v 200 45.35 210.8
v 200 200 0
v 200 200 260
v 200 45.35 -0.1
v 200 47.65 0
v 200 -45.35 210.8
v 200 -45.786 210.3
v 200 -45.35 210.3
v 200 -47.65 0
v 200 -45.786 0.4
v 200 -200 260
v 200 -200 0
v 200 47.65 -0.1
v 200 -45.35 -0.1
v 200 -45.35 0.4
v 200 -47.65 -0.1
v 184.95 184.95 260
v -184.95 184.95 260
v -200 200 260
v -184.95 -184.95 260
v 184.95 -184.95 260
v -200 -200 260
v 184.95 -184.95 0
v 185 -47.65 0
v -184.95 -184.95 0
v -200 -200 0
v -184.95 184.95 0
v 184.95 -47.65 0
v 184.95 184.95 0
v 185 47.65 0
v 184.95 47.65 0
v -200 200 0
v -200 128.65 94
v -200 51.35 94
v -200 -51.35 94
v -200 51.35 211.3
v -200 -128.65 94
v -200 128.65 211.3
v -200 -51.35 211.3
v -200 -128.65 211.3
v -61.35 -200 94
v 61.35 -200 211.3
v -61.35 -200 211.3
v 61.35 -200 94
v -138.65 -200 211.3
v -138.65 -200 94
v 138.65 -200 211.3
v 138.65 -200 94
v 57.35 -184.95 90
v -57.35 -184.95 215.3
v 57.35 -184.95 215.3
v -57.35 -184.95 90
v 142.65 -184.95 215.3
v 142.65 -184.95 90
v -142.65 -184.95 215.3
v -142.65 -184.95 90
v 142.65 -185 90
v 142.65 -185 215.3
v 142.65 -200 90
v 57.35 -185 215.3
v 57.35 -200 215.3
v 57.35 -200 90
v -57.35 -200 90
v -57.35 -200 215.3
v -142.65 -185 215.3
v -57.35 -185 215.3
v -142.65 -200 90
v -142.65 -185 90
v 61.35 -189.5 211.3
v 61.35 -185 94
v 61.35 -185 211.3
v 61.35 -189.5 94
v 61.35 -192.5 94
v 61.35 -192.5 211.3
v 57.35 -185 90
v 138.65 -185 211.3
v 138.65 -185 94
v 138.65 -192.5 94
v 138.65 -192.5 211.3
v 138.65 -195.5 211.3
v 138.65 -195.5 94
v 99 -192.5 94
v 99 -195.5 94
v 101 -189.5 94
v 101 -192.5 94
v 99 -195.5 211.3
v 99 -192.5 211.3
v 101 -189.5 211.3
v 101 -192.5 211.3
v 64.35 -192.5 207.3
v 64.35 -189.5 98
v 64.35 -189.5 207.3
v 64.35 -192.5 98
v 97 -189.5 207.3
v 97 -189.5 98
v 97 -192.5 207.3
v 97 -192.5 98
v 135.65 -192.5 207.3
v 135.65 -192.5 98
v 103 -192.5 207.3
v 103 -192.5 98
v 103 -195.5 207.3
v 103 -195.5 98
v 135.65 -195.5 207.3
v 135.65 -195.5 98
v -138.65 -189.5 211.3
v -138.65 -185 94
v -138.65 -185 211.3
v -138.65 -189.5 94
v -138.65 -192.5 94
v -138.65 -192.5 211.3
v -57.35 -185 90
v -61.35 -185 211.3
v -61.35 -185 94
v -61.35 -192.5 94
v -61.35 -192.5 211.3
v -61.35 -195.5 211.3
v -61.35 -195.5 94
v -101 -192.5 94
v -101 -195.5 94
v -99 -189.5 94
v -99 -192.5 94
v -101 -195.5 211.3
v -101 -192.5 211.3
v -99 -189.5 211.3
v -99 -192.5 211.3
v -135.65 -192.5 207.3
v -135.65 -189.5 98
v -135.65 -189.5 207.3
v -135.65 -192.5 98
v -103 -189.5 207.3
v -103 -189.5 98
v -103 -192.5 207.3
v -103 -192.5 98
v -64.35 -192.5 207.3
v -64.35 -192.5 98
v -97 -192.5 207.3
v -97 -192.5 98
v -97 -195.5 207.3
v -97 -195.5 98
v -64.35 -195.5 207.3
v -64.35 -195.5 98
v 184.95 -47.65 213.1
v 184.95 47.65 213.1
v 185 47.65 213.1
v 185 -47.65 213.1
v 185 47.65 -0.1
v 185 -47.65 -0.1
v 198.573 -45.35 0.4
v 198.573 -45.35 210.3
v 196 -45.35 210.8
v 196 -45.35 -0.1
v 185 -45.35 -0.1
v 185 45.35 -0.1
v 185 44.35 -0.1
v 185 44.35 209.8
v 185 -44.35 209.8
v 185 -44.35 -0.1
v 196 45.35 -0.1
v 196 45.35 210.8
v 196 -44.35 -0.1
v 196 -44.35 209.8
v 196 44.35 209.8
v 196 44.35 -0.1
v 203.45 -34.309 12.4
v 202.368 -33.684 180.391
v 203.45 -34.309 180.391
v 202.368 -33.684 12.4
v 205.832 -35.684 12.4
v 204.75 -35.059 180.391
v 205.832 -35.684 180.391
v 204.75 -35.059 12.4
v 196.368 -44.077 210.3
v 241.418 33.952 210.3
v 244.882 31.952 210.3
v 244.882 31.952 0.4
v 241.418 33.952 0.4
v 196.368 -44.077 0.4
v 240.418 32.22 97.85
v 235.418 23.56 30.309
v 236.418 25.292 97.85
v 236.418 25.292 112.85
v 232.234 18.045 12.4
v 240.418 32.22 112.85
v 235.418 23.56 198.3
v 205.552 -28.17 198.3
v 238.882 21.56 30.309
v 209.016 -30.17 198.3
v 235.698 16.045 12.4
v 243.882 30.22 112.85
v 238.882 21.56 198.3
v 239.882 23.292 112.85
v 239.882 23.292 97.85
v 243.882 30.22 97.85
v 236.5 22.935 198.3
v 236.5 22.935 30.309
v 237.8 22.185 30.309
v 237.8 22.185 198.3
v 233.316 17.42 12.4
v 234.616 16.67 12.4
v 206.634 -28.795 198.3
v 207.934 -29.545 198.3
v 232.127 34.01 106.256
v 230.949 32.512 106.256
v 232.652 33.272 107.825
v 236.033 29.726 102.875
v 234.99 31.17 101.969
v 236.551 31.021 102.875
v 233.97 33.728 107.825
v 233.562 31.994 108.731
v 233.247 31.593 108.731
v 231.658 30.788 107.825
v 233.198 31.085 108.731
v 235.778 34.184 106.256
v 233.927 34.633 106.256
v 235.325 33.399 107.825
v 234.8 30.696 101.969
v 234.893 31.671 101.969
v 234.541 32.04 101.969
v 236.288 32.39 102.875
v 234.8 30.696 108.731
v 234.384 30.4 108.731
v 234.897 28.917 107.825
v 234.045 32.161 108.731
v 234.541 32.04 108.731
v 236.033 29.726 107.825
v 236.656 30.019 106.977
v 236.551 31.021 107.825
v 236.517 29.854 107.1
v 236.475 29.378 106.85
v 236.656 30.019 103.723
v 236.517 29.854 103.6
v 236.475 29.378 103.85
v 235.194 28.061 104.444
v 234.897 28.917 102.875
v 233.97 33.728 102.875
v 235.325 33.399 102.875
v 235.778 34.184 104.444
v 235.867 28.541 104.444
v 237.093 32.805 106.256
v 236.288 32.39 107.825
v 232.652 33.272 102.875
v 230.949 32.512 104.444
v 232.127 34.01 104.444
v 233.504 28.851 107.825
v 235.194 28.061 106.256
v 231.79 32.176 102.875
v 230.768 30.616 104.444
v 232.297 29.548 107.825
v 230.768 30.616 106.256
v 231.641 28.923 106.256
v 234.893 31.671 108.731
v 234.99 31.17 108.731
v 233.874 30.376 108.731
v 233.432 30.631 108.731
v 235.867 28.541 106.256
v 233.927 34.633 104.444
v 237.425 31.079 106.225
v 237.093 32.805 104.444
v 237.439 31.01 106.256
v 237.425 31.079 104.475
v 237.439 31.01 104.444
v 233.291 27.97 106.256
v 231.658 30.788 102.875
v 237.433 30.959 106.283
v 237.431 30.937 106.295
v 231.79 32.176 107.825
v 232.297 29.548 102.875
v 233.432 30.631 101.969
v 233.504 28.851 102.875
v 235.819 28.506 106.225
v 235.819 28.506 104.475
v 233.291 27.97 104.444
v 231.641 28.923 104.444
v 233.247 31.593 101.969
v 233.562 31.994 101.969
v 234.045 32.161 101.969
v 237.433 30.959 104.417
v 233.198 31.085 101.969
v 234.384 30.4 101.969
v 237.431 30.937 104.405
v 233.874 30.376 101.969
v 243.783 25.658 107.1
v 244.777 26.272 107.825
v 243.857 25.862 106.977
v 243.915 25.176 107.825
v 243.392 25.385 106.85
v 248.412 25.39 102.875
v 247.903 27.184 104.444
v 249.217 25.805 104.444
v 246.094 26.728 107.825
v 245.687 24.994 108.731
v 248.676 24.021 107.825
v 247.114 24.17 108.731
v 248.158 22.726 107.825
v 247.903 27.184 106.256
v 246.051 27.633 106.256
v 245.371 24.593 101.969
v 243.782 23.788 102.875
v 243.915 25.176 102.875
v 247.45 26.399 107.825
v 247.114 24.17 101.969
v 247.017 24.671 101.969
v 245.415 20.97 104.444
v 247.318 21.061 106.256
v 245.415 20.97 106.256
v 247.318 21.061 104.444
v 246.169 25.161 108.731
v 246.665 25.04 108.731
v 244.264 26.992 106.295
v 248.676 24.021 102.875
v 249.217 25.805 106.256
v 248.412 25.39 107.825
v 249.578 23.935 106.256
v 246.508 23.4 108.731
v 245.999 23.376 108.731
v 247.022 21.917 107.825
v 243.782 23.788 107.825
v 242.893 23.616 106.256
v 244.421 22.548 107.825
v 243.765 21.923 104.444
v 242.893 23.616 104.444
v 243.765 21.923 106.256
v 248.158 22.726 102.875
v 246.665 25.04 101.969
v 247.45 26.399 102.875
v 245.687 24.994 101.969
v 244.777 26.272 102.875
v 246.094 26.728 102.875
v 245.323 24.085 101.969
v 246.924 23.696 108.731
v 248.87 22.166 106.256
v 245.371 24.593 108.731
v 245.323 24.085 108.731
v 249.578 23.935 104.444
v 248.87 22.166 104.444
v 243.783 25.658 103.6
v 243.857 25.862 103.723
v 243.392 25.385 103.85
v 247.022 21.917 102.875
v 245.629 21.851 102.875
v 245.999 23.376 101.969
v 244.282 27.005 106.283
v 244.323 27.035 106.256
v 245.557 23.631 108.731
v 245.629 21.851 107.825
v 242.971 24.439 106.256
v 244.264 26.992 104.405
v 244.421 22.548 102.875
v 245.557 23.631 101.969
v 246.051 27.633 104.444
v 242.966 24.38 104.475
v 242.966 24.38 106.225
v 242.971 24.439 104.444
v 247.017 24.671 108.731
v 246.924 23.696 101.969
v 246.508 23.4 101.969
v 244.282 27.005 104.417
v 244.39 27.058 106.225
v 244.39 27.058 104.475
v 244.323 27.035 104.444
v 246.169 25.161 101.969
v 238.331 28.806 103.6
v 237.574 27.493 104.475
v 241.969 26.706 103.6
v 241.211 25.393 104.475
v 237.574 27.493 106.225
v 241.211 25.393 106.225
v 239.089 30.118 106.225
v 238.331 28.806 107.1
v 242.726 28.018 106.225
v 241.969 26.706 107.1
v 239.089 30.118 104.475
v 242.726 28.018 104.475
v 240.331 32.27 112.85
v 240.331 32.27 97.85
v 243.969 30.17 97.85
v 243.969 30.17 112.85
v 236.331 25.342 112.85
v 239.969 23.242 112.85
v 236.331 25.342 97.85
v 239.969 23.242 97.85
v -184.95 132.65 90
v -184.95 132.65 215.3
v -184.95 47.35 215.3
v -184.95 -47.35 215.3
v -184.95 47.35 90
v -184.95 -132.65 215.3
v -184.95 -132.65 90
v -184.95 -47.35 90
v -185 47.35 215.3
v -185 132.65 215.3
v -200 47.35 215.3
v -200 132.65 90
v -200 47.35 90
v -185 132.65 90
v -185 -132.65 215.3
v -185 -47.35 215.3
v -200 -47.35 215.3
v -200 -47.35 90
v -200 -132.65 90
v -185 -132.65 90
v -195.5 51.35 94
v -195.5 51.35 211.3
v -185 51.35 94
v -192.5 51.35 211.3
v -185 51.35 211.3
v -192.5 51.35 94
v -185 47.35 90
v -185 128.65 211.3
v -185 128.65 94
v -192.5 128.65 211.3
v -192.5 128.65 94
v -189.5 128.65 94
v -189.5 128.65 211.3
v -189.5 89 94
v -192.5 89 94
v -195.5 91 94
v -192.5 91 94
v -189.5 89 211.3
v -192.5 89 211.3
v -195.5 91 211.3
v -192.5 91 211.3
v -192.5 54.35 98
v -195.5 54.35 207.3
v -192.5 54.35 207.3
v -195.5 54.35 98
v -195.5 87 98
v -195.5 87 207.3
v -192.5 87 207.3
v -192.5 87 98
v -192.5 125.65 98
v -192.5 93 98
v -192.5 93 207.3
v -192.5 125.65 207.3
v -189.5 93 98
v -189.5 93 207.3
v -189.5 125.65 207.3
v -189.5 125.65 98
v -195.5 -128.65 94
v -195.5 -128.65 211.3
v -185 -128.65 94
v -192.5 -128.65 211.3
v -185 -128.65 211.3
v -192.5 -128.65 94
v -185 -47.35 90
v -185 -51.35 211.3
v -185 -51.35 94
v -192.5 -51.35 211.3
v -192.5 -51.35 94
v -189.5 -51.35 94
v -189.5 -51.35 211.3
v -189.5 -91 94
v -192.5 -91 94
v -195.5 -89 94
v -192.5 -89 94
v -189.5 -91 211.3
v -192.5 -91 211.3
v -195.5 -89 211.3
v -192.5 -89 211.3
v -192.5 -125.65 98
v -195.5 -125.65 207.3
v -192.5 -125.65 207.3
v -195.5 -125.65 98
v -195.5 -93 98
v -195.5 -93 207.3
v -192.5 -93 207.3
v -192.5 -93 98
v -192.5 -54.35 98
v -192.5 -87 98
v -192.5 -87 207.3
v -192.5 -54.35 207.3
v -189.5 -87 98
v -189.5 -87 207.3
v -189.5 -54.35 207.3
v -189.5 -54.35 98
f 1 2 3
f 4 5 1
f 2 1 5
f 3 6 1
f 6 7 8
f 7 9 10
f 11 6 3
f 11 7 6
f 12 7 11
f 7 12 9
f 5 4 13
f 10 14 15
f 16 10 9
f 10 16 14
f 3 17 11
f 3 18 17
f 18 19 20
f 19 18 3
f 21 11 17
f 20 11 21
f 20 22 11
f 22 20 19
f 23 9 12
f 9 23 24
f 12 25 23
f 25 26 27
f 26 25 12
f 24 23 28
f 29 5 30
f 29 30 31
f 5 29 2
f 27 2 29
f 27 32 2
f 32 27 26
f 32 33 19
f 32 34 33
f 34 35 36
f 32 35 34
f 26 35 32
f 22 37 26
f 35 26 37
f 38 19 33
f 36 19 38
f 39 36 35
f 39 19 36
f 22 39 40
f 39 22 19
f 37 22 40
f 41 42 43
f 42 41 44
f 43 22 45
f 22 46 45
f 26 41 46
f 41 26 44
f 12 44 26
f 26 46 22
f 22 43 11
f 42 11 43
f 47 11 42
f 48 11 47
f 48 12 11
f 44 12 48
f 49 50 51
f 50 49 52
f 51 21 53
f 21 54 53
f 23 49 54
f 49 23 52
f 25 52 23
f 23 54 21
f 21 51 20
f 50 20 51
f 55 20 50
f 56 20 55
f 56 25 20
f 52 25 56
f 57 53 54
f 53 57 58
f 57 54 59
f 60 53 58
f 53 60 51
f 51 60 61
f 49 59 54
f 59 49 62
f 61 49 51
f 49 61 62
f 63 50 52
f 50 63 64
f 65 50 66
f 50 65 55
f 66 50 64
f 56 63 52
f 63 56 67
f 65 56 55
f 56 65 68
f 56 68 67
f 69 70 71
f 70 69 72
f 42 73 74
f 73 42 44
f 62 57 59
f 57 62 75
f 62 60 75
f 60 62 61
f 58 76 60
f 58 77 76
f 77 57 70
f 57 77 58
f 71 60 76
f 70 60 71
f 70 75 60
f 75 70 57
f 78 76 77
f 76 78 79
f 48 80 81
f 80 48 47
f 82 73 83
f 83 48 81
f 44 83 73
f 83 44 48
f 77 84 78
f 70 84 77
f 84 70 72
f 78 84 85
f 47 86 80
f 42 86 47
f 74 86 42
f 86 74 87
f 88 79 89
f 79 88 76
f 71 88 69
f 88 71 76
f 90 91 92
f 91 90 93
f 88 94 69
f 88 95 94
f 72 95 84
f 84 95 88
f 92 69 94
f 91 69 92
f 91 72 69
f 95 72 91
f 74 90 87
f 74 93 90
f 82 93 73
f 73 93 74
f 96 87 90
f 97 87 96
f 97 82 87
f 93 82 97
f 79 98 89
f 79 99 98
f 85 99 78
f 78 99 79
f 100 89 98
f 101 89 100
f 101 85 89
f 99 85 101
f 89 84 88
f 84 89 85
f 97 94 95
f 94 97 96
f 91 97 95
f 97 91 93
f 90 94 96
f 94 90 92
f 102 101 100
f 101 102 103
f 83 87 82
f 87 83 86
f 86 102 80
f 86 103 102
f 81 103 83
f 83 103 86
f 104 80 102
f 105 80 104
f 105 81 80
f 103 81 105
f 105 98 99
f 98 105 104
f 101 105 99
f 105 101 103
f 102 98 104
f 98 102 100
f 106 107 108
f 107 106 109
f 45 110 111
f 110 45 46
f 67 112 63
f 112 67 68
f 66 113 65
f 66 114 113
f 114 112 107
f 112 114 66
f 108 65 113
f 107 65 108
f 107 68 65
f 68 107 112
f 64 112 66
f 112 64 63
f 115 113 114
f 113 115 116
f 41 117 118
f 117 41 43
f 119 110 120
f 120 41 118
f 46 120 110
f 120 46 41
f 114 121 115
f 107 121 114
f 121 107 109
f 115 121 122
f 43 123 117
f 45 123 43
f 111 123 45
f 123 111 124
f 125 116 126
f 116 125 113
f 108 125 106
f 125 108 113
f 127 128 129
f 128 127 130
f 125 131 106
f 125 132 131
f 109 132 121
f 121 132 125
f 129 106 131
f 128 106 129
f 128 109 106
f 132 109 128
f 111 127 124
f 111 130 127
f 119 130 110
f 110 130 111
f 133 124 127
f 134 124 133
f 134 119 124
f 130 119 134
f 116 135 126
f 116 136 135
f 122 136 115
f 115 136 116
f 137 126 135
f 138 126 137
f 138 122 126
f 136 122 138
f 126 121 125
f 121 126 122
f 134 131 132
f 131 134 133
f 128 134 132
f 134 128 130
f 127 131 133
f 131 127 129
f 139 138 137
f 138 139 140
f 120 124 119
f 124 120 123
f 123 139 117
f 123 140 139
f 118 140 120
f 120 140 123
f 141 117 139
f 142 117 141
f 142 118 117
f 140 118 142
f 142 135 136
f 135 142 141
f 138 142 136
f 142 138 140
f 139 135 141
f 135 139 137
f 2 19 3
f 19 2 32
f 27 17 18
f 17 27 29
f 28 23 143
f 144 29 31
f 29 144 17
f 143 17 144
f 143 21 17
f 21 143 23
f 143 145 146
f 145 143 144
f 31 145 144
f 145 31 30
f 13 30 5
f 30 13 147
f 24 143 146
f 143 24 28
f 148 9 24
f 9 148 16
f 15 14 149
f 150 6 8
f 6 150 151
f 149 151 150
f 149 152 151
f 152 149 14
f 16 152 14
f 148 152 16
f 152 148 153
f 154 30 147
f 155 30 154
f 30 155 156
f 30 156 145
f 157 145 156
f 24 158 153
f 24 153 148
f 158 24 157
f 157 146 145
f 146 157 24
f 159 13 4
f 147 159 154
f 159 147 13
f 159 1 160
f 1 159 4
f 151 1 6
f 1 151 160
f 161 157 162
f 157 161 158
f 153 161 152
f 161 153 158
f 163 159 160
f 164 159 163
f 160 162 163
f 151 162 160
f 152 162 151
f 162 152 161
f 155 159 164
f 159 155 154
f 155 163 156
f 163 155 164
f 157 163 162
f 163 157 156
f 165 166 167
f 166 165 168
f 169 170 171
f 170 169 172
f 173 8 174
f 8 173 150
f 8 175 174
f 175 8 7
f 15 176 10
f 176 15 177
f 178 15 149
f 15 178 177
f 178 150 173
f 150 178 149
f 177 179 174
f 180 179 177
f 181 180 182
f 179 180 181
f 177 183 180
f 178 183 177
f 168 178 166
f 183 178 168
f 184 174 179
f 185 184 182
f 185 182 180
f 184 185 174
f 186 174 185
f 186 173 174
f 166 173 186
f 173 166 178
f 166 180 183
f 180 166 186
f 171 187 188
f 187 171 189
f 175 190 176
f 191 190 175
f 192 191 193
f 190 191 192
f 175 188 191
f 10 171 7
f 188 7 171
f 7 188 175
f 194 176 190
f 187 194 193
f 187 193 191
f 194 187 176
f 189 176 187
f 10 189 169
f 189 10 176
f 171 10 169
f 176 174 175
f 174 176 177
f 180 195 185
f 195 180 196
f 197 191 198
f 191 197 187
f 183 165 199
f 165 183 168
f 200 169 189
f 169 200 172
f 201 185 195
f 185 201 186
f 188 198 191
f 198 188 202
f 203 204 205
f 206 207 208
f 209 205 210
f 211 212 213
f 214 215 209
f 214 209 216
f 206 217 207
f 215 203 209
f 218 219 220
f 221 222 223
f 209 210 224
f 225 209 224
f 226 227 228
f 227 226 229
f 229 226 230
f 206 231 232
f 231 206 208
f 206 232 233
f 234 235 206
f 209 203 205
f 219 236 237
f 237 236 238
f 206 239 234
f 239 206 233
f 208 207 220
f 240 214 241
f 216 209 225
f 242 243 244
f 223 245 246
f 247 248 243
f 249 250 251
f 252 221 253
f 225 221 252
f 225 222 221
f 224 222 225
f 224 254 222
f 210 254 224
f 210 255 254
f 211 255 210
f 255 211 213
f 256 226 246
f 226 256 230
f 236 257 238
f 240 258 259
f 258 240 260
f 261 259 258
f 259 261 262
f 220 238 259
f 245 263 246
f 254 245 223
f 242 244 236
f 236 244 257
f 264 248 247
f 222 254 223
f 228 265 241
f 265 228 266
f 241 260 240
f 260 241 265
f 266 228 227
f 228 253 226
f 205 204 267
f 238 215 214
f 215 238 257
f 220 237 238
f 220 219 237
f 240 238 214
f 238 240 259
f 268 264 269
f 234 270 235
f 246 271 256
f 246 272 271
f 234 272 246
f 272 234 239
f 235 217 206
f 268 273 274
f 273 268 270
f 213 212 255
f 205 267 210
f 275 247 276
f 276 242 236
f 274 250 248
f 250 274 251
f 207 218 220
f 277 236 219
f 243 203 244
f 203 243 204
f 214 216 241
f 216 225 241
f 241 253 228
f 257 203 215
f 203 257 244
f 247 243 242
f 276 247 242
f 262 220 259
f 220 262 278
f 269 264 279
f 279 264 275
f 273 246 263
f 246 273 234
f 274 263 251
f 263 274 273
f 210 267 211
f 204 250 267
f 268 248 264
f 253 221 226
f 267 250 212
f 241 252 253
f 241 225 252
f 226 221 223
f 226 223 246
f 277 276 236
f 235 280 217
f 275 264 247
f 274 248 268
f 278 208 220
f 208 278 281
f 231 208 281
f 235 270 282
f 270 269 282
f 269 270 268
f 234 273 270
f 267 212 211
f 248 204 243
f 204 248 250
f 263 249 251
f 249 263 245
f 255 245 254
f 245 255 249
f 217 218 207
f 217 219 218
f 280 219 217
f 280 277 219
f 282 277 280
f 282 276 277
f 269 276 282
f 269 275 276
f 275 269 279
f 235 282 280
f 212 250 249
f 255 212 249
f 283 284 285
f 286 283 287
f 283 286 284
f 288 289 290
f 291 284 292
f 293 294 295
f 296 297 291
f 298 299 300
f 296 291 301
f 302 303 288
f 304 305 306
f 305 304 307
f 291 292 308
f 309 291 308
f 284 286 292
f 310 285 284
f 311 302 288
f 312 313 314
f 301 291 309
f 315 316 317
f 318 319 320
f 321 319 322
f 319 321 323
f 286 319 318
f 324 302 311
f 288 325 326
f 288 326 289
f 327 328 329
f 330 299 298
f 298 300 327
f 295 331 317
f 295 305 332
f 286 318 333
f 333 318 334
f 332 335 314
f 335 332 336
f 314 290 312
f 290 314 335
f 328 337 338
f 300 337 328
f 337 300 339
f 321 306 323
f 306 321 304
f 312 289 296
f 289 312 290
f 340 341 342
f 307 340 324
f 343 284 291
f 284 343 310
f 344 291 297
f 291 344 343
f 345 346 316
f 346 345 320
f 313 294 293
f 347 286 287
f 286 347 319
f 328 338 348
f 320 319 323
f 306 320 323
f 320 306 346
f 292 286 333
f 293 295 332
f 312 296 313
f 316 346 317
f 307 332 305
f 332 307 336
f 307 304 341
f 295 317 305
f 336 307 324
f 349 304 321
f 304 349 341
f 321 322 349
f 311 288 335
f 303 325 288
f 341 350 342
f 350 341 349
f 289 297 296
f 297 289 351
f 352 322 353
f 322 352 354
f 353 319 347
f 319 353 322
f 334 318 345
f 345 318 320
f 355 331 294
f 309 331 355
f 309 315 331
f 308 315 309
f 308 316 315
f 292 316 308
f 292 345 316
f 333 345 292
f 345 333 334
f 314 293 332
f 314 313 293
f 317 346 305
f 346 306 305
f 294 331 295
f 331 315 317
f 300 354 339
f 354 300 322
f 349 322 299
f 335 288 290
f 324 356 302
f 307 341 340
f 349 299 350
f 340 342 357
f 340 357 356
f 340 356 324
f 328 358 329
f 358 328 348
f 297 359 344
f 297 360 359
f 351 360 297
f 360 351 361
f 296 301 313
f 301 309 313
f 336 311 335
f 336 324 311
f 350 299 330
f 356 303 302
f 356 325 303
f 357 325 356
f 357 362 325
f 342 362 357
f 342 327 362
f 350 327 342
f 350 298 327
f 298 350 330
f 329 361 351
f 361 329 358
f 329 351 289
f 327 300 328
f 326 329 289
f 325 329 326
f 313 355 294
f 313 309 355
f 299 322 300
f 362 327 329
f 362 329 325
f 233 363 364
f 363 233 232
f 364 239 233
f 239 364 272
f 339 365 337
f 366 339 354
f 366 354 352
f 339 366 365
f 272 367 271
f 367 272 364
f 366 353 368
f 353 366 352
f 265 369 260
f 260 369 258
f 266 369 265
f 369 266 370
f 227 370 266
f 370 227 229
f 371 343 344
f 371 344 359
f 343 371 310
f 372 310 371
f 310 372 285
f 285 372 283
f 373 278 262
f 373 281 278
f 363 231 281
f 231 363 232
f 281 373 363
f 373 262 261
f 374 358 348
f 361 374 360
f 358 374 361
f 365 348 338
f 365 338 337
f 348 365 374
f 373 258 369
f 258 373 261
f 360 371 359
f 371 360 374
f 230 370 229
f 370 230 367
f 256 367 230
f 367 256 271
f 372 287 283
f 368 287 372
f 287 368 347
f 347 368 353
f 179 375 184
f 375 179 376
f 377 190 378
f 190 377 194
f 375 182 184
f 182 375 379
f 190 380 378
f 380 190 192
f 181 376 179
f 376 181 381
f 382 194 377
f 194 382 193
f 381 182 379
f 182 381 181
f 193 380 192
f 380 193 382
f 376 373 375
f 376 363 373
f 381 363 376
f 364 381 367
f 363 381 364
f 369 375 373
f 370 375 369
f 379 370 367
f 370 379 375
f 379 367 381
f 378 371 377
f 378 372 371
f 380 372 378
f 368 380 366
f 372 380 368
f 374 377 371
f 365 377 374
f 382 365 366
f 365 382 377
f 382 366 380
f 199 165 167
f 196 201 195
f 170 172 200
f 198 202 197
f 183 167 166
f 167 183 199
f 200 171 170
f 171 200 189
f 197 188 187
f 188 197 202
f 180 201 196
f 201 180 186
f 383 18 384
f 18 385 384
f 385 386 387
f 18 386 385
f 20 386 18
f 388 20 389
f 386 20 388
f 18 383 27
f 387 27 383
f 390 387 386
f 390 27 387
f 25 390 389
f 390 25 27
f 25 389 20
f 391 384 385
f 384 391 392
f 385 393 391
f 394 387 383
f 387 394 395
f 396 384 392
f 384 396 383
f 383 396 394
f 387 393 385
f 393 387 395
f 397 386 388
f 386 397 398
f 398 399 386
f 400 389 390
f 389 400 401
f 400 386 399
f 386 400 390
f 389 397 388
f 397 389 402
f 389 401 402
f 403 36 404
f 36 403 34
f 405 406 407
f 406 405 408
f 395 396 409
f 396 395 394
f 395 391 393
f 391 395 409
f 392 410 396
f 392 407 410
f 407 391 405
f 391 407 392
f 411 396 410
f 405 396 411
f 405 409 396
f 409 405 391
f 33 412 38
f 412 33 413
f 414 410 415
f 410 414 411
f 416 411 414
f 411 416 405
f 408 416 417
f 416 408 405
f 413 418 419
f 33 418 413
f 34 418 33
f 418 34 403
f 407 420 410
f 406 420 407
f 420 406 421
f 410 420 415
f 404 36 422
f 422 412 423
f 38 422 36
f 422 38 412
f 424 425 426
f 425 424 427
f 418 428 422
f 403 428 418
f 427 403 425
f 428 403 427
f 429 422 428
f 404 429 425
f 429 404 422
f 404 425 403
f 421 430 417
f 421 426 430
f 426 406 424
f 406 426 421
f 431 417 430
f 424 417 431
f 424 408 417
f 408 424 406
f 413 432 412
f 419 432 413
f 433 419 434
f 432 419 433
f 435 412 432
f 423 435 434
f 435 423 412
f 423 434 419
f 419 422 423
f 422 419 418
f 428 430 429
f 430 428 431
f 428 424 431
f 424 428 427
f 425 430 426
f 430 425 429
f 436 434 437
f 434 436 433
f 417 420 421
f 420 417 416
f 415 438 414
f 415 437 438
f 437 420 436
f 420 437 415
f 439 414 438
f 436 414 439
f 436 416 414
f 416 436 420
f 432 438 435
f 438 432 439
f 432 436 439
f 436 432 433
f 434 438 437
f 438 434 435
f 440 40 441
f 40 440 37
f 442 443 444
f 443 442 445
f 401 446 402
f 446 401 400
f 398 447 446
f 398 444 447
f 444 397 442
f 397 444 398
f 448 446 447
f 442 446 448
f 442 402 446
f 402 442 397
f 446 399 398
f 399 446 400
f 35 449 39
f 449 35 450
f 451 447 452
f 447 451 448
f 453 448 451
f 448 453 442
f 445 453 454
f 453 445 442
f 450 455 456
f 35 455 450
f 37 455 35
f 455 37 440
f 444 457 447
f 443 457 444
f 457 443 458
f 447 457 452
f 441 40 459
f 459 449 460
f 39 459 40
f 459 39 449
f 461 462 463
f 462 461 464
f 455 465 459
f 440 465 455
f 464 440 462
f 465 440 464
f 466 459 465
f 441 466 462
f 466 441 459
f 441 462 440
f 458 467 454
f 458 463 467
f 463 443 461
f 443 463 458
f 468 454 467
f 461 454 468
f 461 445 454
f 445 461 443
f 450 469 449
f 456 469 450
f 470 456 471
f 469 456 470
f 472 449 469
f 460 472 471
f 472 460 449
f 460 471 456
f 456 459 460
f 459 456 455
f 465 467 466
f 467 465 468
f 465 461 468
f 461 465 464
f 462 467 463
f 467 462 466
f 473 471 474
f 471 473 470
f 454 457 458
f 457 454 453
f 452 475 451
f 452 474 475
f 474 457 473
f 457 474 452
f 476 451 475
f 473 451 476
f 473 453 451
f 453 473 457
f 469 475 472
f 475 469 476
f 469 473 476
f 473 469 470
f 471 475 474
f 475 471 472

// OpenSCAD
// file: ../windows/slidingwindow.scad
module slidingwindow(width=120, height=200, wall_thickness=15) 
{
    profile_width = 4;
    profile_depth = 3.0;
    frame_profile_width = 4;
    frame_profile_depth = wall_thickness;
    
    /* Outer frame fixed to convrete wall. */
    color([0.2,0.0,0.1])
    genericframe(width, height, frame_profile_width, frame_profile_depth);

    /* Calculate opning size. */
    open_w = width - 2 * frame_profile_width;
    open_h = height - 2 * frame_profile_width;
    half_open_w = (open_w + frame_profile_width)/2; 
    
    /* Left window glass frame. */
    translate([-(open_w)/4, profile_depth/2, 0]) 
    color([0.5,0.3,0.3])
    genericframe(half_open_w, open_h, profile_width, profile_depth);

    /* Right window glass frame. */
    translate([(open_w)/4, -profile_depth/2, 0]) 
    color([0.5,0.3,0.3])
    genericframe(half_open_w, open_h, profile_width, profile_depth);
}

module genericframe(width=70, height=110, profile_width = 5, profile_depth = 8) 
{
    translate([-(width - profile_width)/2, 0, 0]) 
    cube([profile_width,profile_depth, height], center=true);
    
    translate([(width - profile_width)/2, 0, 0]) 
    cube([profile_width,profile_depth, height], center=true);

    translate([0, 0, -(height - profile_width)/2]) 
    cube([width, profile_depth, profile_width], center=true);

    translate([0, 0, (height - profile_width)/2]) 
    cube([width, profile_depth, profile_width], center=true);
}    

// For testing
slidingwindow();
// file: ../doors/basicdoor.scad
module basicdoor(width=95.3, height=213.2, wall_thickness=15, right_handed = true, open_angle = 0) 
{
    profile_width = 12;
    door_thickness = 4.0;
    frame_profile_width = 2.3;
    frame_profile_depth = wall_thickness;
    seal_profile_width = 1.0;
    
    /* Outer frame fixed to convrete wall. */
    color([0.3,0.0,0.1])
    basicdoorframe(false, width, height, frame_profile_width, frame_profile_depth);

    color([0.4,0.2,0.2])
    translate([0, door_thickness/2,-frame_profile_width/2])
    basicdoorframe(false, width - 2 * frame_profile_width,
        height - frame_profile_width, 
        seal_profile_width, frame_profile_depth - door_thickness);
    
    /* Calculate door size. */
    open_w = width - 2 * frame_profile_width - 0.6;
    open_h = height - frame_profile_width - 1.0;

    ow = open_w/2 + 0.2;
    translate([right_handed?-ow:ow, 
        -(frame_profile_depth-door_thickness)/2, -frame_profile_width/2])
    rotate([0, 0, right_handed?-open_angle:open_angle])
    translate([right_handed?ow:-ow, 0, 0])
     union() {
        /* Playwood */
        color([0.4,0.0,0.1])
        cube([open_w, 1.5, open_h], center=true);
        
        /* Door strengtehing. */
        color([0.5,0.2,0.2])
        basicdoorframe(true, open_w, open_h, profile_width, door_thickness);
        
         /* Diagonal strengthening */
        dx = open_w - 2*profile_width;
        dy = open_h - 2*profile_width;
        l = sqrt(dx*dx+dy*dy);
        rotate([0,-atan2(dx,dy), 0])
        color([0.5,0.2,0.2])
        cube([profile_width, door_thickness, l], center=true);
         
         /* Door knob */
         translate([open_w/2 - 6.0, 0, 0])
         color([218/255,172/255,96/255])
         doorknob(door_thickness);
    }
}

module basicdoorframe(draw_bottom=true,width=70, height=110, profile_width = 5, door_thickness = 8) 
{
    translate([-(width - profile_width)/2, 0, 0]) 
    cube([profile_width,door_thickness, height], center=true);
    
    translate([(width - profile_width)/2, 0, 0]) 
    cube([profile_width,door_thickness, height], center=true);

    if (draw_bottom) {
        translate([0, 0, -(height - profile_width)/2]) 
        cube([width, door_thickness, profile_width], center=true);
    }
    
    translate([0, 0, (height - profile_width)/2]) 
    cube([width, door_thickness, profile_width], center=true);
}    

module doorknob(door_thickness = 8)
{
    doorknob_length = 7;
    doorknob_r = 3.5;
    
    translate([0, doorknob_length, 0]) 
    sphere(r=doorknob_r);
    translate([0, -doorknob_length, 0]) 
    sphere(r=doorknob_r);
 
    rotate([90, 90, 0])
    cylinder(h = doorknob_length*2, r = 0.5 * doorknob_r, center=true);
   
    cube([8, door_thickness+0.2, 15],center=true); 
}

// For testing
basicdoor();
// file: bedroomwalls.scad
use <../doors/basicdoor.scad>
use <../windows/slidingwindow.scad>

module bedroomwalls(door_x = 0, bedroom_nr=1, width=350, length=400, wall_thickness=15, wall_height=260,wall_color=[255/255, 255/255, 255/255],wall_alpha=1.0, paint_the_room = [0.0, 0.3,0.9],
    window_y = 90, window_w = 80+5.3, window_h = 120+5.3)
{
    // Door opening size. Then we need some extra space for the door frame.
    door_width = 90+5.3;
    door_height = 210+3.2;
    
    // Position the door vertically
    door_y_pos = (wall_height-door_height)/2+0.1;
    
    /* Window positions */
    window_1_x_pos = bedroom_nr == 1 ? 100 : 50;
    window_2_x_pos = -window_1_x_pos;
    window_3_x_pos = bedroom_nr == 1 ? 90 : 50;
    window_4_x_pos = -window_3_x_pos;
    
    // Rise the part of floor which should stay dry by 2.5 cm.
    rise_floor = 2.5;
    rised_width = width/2;
    
    // Rise walk in floor more to allow sitting to toilet seat with dry feet by 2.0 cm for 100 cm
    double_rise_floor = 2.0;
    double_rised_length = 100;
    
    // Hole size, 8 cm
    hole_size = 8;

    difference() {
        union() {
            translate([0,-width/2+wall_thickness/2, wall_height/2]) 
            color(wall_color,wall_alpha) 
            cube([length, wall_thickness, wall_height],center=true);
            
            translate([0,-width/2+wall_thickness, wall_height/2]) 
            color(paint_the_room,wall_alpha) 
            cube([length, 0.1, wall_height],center=true);
        }
        
        /* Window 1 hole */
        if (bedroom_nr != 2) {
            translate([window_1_x_pos,-width/2+wall_thickness/2,
                window_y + window_h/2]) 
            cube([window_w, wall_thickness+1, 
                window_h],center=true);
        }
        
        /* Window 2 hole */
        if (bedroom_nr == 1) {
            translate([window_2_x_pos,-width/2+wall_thickness/2,
                window_y + window_h/2]) 
            cube([window_w, wall_thickness+1, 
                window_h],center=true);
        }
    }
    
    /* Window 1 */
    if (bedroom_nr != 2) {
        translate([window_1_x_pos,-width/2+wall_thickness/2,
            window_y + window_h/2]) 
        slidingwindow(window_w, window_h, wall_thickness); 
    }
    
    /* Window 2 */
    if (bedroom_nr == 1) {
        translate([window_2_x_pos,-width/2+wall_thickness/2,
            window_y + window_h/2]) 
        slidingwindow(window_w, window_h, wall_thickness); 
    }
    
    difference() {
        union() {
            translate([0,width/2-wall_thickness/2, wall_height/2])
            color(wall_color,wall_alpha) 
            cube([length, wall_thickness, wall_height],center=true);
            
            translate([0,width/2-wall_thickness, wall_height/2])
            color(paint_the_room,wall_alpha)
            cube([length,  0.1, wall_height],center=true);
        }

        /* Door hole */
        if (bedroom_nr==3) {
            translate([door_x, width/2 - wall_thickness/2, 
                wall_height/2 - door_y_pos]) 
            cube([door_width, wall_thickness+1, door_height],
                center=true); 
        }
    }
    
    /* Door */
    if (bedroom_nr==3) {
        translate([door_x, width/2 - wall_thickness/2, 
            wall_height/2 - door_y_pos]) 
        rotate([0,0,180])
        basicdoor(door_width, door_height, wall_thickness, true, 45);
    } 
        
    difference() {
        union() {
            translate([length/2-wall_thickness/2, 0, wall_height/2]) 
            color(wall_color,wall_alpha) 
            cube([wall_thickness, width, wall_height],center=true);
            
            translate([length/2-wall_thickness, 0, wall_height/2]) 
            color(paint_the_room,wall_alpha) 
            cube([0.1, width, wall_height],center=true);
        }

        /* Door opening */
        if (bedroom_nr<=2) {
            translate([length/2-wall_thickness/2, door_x, wall_height/2-door_y_pos])
            cube([wall_thickness+1, door_width, door_height],center=true);
        }
    }     

    /* Door */
    if (bedroom_nr<=2) {
        translate([length/2-wall_thickness/2, door_x, wall_height/2-door_y_pos])
        rotate([0,0,90])
        basicdoor(door_width, door_height, wall_thickness, true, 30);
        
    }
    difference() {
        union() {
            translate([-length/2+wall_thickness/2, 0, wall_height/2]) 
            color(wall_color,wall_alpha) 
            cube([wall_thickness, width, wall_height],center=true);
            
            translate([-length/2+wall_thickness, 0, wall_height/2])
            color(paint_the_room,wall_alpha) 
            cube([0.1, width, wall_height],center=true);
        }
        
        /* Window 3 hole */
        if (bedroom_nr != 3) {
            translate([-length/2+wall_thickness/2, 
                window_3_x_pos, 
                window_y + window_h/2]) 
            cube([wall_thickness+1, window_w,  
                window_h],center=true);
        }
        
        /* Window 4 hole */
        if (bedroom_nr != 3) {
            translate([-length/2+wall_thickness/2, 
                -window_3_x_pos, 
                window_y + window_h/2]) 
            cube([wall_thickness+1, window_w,  
                window_h],center=true);
        }
    }
    
    /* Window 3 */
    if (bedroom_nr != 3) {
        translate([-length/2+wall_thickness/2, 
                window_3_x_pos, window_y + window_h/2])
        rotate([0,0,90])
        slidingwindow(window_w, window_h, wall_thickness); 
    }
    
    /* Window 4 */
    if (bedroom_nr != 3) {
        translate([-length/2+wall_thickness/2, 
                window_4_x_pos, window_y + window_h/2])
        rotate([0,0,90])
        slidingwindow(window_w, window_h, wall_thickness); 
    }
}

/* For testing */
bedroomwalls();
// main file
 use <bedroomwalls.scad>

module bedroom(door_x = 0, bedroom_nr=1, width=400, length=400, wall_thickness=15, wall_height=260,wall_color=[255/255, 255/255, 255/255], wall_alpha=1.0, paint_the_room = [0.0, 0.3,0.9]) 
{
    bedroomwalls(door_x, bedroom_nr, width, length, wall_thickness, wall_height ,wall_color,wall_alpha,paint_the_room);
}

// For testing
bedroom();
